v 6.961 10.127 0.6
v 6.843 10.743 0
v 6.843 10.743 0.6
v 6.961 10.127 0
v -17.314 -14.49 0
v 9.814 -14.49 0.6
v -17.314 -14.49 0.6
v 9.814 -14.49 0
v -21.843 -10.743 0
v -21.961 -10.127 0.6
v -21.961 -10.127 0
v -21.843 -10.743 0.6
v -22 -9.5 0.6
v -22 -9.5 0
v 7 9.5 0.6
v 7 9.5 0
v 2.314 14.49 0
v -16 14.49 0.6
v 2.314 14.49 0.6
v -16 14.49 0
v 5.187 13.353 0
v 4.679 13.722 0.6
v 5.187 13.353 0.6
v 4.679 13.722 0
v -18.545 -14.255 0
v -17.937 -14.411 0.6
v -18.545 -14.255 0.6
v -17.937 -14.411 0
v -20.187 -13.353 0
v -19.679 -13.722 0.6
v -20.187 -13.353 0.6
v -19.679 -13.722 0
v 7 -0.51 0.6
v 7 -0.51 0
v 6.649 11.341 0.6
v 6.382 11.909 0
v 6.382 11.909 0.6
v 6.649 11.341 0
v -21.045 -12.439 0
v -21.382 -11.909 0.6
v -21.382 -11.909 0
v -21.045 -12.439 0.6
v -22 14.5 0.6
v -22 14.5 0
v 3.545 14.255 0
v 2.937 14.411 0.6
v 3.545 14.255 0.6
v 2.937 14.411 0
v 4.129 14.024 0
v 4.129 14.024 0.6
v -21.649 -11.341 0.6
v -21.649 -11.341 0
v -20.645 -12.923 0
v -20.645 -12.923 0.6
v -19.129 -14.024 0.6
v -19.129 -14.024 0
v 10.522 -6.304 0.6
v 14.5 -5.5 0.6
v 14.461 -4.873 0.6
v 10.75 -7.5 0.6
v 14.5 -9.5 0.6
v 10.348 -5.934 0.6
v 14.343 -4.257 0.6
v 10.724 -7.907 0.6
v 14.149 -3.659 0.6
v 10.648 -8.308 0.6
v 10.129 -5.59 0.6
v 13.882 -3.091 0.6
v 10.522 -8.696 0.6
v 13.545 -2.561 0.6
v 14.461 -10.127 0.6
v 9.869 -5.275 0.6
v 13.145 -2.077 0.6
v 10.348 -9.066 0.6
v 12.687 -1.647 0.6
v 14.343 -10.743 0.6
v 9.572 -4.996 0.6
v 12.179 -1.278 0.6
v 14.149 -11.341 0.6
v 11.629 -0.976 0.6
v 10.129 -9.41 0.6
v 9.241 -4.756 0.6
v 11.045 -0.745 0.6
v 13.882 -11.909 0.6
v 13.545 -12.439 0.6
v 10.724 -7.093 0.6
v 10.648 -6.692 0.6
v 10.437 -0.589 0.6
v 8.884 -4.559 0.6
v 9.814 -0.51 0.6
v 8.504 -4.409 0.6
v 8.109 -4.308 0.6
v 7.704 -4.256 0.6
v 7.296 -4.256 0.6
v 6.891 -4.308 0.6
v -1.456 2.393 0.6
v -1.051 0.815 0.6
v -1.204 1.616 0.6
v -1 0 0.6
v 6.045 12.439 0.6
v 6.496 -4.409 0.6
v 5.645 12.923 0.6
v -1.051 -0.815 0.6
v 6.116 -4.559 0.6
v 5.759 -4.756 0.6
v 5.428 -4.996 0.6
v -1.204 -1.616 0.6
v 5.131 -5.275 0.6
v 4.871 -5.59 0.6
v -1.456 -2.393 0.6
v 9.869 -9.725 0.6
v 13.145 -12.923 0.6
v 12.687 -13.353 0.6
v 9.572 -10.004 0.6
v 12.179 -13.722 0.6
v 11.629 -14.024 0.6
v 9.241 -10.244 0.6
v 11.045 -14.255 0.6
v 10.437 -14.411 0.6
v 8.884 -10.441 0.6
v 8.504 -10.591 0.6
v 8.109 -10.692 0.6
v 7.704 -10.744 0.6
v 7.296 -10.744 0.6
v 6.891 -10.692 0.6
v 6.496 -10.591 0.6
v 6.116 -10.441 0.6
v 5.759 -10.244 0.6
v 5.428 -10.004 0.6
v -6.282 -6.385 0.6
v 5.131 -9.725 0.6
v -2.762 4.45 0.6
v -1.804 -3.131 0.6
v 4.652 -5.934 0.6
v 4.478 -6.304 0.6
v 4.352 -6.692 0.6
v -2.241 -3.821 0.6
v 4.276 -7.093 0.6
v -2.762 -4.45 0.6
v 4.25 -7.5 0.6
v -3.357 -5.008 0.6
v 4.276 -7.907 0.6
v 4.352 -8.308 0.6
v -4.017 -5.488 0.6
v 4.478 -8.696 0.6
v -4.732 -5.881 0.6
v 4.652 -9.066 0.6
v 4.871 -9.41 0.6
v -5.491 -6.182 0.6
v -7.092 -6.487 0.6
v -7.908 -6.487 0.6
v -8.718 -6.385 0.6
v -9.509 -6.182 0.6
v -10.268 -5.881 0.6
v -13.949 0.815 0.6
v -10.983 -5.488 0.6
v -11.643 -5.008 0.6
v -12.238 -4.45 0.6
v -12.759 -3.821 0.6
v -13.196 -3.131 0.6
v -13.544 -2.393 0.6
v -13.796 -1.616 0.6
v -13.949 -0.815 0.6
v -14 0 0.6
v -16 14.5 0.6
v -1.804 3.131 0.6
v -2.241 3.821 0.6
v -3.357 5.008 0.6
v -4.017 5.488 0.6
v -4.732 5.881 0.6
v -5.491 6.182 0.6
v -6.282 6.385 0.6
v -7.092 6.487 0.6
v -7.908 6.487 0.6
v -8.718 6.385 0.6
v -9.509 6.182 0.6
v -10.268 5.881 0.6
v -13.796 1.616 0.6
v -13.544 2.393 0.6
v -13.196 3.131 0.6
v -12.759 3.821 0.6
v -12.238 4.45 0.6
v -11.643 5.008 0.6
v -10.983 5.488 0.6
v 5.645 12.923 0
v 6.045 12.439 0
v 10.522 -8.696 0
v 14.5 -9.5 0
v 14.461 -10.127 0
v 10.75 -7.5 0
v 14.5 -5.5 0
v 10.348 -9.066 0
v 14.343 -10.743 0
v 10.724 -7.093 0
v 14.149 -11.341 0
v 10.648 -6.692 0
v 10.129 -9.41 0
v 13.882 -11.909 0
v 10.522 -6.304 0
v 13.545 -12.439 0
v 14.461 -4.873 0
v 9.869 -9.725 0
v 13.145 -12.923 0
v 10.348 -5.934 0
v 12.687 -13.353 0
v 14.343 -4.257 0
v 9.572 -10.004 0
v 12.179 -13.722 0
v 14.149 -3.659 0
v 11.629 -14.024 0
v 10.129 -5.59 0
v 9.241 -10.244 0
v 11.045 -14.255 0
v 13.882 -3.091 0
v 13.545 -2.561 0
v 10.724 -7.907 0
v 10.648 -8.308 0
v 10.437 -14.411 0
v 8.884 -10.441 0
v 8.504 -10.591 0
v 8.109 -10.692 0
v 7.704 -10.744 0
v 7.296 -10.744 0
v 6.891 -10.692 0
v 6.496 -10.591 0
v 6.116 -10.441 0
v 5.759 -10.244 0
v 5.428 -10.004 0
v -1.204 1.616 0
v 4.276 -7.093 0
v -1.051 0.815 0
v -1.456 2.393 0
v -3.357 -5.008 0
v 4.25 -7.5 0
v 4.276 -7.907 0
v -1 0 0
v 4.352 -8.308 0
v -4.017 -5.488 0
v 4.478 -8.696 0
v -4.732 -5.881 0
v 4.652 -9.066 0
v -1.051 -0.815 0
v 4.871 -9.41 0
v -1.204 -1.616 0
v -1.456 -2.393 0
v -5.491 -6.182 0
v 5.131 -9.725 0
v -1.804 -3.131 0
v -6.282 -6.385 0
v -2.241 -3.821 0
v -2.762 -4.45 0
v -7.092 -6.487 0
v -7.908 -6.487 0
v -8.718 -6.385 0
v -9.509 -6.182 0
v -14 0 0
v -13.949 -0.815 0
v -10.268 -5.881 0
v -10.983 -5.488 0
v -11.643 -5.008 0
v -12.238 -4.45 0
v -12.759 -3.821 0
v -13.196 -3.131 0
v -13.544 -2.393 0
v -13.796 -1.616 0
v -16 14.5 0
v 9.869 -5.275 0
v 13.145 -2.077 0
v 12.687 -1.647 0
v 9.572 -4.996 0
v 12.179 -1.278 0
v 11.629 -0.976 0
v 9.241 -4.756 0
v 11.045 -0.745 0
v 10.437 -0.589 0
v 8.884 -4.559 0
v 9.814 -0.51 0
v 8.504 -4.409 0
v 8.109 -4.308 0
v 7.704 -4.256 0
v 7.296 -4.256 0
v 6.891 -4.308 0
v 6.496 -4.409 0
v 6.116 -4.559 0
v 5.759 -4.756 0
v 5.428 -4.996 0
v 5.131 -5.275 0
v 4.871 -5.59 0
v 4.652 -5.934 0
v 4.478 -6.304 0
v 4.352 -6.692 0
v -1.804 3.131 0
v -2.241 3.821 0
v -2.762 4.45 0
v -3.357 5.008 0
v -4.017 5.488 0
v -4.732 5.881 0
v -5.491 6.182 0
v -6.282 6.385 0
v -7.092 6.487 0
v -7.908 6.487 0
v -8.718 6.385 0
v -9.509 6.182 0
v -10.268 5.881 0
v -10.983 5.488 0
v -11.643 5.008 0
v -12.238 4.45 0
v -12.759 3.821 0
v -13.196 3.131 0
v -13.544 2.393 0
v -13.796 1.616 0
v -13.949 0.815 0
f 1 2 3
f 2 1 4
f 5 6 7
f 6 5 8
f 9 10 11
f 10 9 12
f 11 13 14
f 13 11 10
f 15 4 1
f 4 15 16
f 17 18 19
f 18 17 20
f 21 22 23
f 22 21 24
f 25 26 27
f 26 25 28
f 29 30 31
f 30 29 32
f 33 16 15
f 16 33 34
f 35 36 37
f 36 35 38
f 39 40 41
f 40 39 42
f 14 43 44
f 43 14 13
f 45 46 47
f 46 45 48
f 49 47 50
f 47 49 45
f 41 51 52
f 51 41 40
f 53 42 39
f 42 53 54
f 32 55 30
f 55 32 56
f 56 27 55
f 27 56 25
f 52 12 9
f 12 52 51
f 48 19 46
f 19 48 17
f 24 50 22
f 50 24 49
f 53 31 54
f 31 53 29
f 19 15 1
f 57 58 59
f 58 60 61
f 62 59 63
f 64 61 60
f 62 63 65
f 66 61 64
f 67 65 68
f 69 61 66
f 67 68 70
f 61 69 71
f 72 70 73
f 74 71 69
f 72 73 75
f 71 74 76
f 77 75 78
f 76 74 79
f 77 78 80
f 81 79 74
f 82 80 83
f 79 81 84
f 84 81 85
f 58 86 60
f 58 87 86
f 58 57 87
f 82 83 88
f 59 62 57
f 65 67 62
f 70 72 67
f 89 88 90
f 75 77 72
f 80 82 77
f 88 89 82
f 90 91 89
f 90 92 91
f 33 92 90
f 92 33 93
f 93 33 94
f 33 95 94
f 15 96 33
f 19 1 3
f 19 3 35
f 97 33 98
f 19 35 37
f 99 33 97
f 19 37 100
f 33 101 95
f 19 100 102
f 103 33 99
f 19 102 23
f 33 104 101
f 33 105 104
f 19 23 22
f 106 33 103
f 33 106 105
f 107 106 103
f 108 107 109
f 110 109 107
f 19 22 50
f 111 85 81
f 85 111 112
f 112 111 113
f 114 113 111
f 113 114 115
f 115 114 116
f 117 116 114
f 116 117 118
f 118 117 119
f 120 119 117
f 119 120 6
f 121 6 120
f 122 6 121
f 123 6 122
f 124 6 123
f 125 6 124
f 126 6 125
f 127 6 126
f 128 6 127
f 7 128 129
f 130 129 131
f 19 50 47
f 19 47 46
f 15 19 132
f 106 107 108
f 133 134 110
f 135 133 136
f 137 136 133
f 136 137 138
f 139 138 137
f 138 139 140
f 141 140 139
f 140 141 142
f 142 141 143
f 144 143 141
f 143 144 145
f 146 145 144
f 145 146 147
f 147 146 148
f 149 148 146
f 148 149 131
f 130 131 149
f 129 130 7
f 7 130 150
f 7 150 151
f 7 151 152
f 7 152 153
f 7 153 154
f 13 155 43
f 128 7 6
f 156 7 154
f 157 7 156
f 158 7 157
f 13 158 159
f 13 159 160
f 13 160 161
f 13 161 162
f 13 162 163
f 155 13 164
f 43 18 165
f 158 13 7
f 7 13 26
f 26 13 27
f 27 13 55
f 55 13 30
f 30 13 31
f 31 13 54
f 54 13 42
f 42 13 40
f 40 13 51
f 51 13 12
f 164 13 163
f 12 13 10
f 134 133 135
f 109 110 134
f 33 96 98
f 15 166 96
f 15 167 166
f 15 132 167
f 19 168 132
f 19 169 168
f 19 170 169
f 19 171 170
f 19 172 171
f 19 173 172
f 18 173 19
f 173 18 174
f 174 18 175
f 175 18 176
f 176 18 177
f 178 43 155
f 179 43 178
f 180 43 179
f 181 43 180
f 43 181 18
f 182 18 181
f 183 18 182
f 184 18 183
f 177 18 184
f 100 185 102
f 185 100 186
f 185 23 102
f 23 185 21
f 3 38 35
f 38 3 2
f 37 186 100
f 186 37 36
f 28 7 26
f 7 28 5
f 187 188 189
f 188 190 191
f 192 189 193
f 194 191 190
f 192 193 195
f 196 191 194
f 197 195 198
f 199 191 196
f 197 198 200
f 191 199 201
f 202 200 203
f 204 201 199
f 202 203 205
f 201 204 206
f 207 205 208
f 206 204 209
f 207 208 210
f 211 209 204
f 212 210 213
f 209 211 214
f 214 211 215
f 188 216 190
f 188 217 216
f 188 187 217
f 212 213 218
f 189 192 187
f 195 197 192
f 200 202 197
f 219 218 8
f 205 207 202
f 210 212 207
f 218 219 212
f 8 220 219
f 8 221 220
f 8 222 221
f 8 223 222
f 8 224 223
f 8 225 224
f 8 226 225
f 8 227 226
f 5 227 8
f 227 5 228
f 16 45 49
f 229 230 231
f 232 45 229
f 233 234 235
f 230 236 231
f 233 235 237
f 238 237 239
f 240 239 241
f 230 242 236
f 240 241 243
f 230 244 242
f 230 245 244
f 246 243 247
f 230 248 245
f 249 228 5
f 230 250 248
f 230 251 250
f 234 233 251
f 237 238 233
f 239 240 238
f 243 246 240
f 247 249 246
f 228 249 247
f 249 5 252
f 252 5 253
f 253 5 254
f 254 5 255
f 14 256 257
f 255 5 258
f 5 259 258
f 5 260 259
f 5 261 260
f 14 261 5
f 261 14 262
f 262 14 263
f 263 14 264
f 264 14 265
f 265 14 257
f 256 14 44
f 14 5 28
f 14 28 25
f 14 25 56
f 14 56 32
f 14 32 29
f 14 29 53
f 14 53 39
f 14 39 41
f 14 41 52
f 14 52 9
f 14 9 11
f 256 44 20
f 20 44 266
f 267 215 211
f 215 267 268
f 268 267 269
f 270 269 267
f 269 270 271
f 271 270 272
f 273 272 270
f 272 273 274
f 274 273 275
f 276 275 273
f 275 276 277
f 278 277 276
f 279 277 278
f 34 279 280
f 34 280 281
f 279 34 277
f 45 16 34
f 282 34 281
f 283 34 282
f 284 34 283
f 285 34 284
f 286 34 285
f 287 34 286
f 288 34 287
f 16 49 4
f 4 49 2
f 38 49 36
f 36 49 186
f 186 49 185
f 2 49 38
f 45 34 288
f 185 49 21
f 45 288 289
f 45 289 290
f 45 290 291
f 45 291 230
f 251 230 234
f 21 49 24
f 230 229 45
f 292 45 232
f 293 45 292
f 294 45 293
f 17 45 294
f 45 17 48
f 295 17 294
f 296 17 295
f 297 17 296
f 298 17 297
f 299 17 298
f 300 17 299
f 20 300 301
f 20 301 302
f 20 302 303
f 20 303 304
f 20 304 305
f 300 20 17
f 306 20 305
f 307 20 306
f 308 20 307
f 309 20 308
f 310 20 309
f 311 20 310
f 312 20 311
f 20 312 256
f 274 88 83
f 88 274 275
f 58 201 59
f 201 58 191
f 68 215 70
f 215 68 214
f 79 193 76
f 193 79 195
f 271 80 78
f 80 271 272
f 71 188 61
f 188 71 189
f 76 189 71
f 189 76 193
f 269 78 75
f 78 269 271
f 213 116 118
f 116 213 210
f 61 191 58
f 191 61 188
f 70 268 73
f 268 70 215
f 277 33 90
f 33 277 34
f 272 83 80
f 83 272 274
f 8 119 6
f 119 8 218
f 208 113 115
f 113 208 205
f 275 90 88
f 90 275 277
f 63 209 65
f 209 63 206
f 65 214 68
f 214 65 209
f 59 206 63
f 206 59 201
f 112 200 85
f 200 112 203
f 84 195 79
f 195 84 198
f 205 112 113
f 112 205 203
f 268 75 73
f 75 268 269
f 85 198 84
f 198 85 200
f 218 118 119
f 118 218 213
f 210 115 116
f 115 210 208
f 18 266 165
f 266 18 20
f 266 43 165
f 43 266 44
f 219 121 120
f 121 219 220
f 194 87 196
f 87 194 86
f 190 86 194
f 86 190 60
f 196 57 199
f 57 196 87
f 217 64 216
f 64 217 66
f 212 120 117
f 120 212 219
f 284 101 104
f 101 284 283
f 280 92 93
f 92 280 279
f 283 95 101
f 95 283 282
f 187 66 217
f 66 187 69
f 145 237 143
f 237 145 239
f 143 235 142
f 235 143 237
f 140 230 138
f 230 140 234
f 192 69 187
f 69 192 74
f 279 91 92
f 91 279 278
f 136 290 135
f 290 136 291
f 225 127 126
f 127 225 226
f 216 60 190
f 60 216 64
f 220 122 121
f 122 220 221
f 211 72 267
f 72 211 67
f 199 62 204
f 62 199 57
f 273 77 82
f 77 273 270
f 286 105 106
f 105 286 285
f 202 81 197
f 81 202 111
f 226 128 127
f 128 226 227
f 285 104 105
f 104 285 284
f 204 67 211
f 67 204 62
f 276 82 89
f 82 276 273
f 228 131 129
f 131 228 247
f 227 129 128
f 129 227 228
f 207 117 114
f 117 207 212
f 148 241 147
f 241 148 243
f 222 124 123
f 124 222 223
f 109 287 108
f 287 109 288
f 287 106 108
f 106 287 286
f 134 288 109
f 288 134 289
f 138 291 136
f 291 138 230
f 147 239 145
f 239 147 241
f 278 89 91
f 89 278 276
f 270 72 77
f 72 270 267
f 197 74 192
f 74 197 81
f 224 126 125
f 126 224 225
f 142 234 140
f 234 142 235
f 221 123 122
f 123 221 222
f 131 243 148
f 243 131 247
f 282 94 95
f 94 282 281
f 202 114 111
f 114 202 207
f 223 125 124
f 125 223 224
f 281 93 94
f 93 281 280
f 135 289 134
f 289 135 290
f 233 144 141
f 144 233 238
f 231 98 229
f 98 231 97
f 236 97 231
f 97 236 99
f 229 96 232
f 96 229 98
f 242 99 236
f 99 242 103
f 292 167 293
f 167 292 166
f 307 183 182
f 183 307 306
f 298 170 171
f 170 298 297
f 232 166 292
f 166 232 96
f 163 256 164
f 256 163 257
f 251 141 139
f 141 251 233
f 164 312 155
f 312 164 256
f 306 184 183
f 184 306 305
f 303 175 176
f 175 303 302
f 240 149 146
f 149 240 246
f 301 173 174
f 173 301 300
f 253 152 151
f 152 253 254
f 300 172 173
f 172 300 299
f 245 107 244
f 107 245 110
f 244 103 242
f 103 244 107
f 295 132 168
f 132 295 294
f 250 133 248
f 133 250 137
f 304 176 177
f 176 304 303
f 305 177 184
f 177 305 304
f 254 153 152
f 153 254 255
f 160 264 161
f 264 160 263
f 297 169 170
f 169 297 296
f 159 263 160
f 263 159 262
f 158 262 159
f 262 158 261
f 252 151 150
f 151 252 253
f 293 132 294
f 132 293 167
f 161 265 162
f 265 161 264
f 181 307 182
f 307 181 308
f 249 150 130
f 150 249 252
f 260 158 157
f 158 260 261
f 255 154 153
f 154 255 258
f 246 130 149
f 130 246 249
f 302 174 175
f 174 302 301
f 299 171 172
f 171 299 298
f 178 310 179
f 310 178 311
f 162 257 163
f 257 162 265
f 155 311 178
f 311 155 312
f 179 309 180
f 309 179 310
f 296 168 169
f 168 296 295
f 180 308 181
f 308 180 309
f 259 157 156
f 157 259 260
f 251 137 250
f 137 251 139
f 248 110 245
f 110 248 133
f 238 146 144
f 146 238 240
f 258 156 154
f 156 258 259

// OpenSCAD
$fn = 50;


difference() {
	union() {
		translate(v = [-7.5000000000, 0, 0]) {
			hull() {
				translate(v = [-9.5000000000, 9.5000000000, 0]) {
					cylinder(h = 0.6000000000, r = 5);
				}
				translate(v = [9.5000000000, 9.5000000000, 0]) {
					cylinder(h = 0.6000000000, r = 5);
				}
				translate(v = [-9.5000000000, -9.5000000000, 0]) {
					cylinder(h = 0.6000000000, r = 5);
				}
				translate(v = [9.5000000000, -9.5000000000, 0]) {
					cylinder(h = 0.6000000000, r = 5);
				}
			}
		}
		translate(v = [0.0000000000, -7.5000000000, 0]) {
			hull() {
				translate(v = [-9.5000000000, 2.0000000000, 0]) {
					cylinder(h = 0.6000000000, r = 5);
				}
				translate(v = [9.5000000000, 2.0000000000, 0]) {
					cylinder(h = 0.6000000000, r = 5);
				}
				translate(v = [-9.5000000000, -2.0000000000, 0]) {
					cylinder(h = 0.6000000000, r = 5);
				}
				translate(v = [9.5000000000, -2.0000000000, 0]) {
					cylinder(h = 0.6000000000, r = 5);
				}
			}
		}
		translate(v = [-22.0000000000, 8.5000000000, 0]) {
			cube(size = [6, 6, 0.6000000000]);
		}
	}
	union() {
		translate(v = [7.5000000000, -7.5000000000, -100.0000000000]) {
			cylinder(h = 200, r = 3.2500000000);
		}
		translate(v = [-7.5000000000, 0, 0.0000000000]) {
			cylinder(h = 0.6000000000, r = 6.5000000000);
		}
	}
}
